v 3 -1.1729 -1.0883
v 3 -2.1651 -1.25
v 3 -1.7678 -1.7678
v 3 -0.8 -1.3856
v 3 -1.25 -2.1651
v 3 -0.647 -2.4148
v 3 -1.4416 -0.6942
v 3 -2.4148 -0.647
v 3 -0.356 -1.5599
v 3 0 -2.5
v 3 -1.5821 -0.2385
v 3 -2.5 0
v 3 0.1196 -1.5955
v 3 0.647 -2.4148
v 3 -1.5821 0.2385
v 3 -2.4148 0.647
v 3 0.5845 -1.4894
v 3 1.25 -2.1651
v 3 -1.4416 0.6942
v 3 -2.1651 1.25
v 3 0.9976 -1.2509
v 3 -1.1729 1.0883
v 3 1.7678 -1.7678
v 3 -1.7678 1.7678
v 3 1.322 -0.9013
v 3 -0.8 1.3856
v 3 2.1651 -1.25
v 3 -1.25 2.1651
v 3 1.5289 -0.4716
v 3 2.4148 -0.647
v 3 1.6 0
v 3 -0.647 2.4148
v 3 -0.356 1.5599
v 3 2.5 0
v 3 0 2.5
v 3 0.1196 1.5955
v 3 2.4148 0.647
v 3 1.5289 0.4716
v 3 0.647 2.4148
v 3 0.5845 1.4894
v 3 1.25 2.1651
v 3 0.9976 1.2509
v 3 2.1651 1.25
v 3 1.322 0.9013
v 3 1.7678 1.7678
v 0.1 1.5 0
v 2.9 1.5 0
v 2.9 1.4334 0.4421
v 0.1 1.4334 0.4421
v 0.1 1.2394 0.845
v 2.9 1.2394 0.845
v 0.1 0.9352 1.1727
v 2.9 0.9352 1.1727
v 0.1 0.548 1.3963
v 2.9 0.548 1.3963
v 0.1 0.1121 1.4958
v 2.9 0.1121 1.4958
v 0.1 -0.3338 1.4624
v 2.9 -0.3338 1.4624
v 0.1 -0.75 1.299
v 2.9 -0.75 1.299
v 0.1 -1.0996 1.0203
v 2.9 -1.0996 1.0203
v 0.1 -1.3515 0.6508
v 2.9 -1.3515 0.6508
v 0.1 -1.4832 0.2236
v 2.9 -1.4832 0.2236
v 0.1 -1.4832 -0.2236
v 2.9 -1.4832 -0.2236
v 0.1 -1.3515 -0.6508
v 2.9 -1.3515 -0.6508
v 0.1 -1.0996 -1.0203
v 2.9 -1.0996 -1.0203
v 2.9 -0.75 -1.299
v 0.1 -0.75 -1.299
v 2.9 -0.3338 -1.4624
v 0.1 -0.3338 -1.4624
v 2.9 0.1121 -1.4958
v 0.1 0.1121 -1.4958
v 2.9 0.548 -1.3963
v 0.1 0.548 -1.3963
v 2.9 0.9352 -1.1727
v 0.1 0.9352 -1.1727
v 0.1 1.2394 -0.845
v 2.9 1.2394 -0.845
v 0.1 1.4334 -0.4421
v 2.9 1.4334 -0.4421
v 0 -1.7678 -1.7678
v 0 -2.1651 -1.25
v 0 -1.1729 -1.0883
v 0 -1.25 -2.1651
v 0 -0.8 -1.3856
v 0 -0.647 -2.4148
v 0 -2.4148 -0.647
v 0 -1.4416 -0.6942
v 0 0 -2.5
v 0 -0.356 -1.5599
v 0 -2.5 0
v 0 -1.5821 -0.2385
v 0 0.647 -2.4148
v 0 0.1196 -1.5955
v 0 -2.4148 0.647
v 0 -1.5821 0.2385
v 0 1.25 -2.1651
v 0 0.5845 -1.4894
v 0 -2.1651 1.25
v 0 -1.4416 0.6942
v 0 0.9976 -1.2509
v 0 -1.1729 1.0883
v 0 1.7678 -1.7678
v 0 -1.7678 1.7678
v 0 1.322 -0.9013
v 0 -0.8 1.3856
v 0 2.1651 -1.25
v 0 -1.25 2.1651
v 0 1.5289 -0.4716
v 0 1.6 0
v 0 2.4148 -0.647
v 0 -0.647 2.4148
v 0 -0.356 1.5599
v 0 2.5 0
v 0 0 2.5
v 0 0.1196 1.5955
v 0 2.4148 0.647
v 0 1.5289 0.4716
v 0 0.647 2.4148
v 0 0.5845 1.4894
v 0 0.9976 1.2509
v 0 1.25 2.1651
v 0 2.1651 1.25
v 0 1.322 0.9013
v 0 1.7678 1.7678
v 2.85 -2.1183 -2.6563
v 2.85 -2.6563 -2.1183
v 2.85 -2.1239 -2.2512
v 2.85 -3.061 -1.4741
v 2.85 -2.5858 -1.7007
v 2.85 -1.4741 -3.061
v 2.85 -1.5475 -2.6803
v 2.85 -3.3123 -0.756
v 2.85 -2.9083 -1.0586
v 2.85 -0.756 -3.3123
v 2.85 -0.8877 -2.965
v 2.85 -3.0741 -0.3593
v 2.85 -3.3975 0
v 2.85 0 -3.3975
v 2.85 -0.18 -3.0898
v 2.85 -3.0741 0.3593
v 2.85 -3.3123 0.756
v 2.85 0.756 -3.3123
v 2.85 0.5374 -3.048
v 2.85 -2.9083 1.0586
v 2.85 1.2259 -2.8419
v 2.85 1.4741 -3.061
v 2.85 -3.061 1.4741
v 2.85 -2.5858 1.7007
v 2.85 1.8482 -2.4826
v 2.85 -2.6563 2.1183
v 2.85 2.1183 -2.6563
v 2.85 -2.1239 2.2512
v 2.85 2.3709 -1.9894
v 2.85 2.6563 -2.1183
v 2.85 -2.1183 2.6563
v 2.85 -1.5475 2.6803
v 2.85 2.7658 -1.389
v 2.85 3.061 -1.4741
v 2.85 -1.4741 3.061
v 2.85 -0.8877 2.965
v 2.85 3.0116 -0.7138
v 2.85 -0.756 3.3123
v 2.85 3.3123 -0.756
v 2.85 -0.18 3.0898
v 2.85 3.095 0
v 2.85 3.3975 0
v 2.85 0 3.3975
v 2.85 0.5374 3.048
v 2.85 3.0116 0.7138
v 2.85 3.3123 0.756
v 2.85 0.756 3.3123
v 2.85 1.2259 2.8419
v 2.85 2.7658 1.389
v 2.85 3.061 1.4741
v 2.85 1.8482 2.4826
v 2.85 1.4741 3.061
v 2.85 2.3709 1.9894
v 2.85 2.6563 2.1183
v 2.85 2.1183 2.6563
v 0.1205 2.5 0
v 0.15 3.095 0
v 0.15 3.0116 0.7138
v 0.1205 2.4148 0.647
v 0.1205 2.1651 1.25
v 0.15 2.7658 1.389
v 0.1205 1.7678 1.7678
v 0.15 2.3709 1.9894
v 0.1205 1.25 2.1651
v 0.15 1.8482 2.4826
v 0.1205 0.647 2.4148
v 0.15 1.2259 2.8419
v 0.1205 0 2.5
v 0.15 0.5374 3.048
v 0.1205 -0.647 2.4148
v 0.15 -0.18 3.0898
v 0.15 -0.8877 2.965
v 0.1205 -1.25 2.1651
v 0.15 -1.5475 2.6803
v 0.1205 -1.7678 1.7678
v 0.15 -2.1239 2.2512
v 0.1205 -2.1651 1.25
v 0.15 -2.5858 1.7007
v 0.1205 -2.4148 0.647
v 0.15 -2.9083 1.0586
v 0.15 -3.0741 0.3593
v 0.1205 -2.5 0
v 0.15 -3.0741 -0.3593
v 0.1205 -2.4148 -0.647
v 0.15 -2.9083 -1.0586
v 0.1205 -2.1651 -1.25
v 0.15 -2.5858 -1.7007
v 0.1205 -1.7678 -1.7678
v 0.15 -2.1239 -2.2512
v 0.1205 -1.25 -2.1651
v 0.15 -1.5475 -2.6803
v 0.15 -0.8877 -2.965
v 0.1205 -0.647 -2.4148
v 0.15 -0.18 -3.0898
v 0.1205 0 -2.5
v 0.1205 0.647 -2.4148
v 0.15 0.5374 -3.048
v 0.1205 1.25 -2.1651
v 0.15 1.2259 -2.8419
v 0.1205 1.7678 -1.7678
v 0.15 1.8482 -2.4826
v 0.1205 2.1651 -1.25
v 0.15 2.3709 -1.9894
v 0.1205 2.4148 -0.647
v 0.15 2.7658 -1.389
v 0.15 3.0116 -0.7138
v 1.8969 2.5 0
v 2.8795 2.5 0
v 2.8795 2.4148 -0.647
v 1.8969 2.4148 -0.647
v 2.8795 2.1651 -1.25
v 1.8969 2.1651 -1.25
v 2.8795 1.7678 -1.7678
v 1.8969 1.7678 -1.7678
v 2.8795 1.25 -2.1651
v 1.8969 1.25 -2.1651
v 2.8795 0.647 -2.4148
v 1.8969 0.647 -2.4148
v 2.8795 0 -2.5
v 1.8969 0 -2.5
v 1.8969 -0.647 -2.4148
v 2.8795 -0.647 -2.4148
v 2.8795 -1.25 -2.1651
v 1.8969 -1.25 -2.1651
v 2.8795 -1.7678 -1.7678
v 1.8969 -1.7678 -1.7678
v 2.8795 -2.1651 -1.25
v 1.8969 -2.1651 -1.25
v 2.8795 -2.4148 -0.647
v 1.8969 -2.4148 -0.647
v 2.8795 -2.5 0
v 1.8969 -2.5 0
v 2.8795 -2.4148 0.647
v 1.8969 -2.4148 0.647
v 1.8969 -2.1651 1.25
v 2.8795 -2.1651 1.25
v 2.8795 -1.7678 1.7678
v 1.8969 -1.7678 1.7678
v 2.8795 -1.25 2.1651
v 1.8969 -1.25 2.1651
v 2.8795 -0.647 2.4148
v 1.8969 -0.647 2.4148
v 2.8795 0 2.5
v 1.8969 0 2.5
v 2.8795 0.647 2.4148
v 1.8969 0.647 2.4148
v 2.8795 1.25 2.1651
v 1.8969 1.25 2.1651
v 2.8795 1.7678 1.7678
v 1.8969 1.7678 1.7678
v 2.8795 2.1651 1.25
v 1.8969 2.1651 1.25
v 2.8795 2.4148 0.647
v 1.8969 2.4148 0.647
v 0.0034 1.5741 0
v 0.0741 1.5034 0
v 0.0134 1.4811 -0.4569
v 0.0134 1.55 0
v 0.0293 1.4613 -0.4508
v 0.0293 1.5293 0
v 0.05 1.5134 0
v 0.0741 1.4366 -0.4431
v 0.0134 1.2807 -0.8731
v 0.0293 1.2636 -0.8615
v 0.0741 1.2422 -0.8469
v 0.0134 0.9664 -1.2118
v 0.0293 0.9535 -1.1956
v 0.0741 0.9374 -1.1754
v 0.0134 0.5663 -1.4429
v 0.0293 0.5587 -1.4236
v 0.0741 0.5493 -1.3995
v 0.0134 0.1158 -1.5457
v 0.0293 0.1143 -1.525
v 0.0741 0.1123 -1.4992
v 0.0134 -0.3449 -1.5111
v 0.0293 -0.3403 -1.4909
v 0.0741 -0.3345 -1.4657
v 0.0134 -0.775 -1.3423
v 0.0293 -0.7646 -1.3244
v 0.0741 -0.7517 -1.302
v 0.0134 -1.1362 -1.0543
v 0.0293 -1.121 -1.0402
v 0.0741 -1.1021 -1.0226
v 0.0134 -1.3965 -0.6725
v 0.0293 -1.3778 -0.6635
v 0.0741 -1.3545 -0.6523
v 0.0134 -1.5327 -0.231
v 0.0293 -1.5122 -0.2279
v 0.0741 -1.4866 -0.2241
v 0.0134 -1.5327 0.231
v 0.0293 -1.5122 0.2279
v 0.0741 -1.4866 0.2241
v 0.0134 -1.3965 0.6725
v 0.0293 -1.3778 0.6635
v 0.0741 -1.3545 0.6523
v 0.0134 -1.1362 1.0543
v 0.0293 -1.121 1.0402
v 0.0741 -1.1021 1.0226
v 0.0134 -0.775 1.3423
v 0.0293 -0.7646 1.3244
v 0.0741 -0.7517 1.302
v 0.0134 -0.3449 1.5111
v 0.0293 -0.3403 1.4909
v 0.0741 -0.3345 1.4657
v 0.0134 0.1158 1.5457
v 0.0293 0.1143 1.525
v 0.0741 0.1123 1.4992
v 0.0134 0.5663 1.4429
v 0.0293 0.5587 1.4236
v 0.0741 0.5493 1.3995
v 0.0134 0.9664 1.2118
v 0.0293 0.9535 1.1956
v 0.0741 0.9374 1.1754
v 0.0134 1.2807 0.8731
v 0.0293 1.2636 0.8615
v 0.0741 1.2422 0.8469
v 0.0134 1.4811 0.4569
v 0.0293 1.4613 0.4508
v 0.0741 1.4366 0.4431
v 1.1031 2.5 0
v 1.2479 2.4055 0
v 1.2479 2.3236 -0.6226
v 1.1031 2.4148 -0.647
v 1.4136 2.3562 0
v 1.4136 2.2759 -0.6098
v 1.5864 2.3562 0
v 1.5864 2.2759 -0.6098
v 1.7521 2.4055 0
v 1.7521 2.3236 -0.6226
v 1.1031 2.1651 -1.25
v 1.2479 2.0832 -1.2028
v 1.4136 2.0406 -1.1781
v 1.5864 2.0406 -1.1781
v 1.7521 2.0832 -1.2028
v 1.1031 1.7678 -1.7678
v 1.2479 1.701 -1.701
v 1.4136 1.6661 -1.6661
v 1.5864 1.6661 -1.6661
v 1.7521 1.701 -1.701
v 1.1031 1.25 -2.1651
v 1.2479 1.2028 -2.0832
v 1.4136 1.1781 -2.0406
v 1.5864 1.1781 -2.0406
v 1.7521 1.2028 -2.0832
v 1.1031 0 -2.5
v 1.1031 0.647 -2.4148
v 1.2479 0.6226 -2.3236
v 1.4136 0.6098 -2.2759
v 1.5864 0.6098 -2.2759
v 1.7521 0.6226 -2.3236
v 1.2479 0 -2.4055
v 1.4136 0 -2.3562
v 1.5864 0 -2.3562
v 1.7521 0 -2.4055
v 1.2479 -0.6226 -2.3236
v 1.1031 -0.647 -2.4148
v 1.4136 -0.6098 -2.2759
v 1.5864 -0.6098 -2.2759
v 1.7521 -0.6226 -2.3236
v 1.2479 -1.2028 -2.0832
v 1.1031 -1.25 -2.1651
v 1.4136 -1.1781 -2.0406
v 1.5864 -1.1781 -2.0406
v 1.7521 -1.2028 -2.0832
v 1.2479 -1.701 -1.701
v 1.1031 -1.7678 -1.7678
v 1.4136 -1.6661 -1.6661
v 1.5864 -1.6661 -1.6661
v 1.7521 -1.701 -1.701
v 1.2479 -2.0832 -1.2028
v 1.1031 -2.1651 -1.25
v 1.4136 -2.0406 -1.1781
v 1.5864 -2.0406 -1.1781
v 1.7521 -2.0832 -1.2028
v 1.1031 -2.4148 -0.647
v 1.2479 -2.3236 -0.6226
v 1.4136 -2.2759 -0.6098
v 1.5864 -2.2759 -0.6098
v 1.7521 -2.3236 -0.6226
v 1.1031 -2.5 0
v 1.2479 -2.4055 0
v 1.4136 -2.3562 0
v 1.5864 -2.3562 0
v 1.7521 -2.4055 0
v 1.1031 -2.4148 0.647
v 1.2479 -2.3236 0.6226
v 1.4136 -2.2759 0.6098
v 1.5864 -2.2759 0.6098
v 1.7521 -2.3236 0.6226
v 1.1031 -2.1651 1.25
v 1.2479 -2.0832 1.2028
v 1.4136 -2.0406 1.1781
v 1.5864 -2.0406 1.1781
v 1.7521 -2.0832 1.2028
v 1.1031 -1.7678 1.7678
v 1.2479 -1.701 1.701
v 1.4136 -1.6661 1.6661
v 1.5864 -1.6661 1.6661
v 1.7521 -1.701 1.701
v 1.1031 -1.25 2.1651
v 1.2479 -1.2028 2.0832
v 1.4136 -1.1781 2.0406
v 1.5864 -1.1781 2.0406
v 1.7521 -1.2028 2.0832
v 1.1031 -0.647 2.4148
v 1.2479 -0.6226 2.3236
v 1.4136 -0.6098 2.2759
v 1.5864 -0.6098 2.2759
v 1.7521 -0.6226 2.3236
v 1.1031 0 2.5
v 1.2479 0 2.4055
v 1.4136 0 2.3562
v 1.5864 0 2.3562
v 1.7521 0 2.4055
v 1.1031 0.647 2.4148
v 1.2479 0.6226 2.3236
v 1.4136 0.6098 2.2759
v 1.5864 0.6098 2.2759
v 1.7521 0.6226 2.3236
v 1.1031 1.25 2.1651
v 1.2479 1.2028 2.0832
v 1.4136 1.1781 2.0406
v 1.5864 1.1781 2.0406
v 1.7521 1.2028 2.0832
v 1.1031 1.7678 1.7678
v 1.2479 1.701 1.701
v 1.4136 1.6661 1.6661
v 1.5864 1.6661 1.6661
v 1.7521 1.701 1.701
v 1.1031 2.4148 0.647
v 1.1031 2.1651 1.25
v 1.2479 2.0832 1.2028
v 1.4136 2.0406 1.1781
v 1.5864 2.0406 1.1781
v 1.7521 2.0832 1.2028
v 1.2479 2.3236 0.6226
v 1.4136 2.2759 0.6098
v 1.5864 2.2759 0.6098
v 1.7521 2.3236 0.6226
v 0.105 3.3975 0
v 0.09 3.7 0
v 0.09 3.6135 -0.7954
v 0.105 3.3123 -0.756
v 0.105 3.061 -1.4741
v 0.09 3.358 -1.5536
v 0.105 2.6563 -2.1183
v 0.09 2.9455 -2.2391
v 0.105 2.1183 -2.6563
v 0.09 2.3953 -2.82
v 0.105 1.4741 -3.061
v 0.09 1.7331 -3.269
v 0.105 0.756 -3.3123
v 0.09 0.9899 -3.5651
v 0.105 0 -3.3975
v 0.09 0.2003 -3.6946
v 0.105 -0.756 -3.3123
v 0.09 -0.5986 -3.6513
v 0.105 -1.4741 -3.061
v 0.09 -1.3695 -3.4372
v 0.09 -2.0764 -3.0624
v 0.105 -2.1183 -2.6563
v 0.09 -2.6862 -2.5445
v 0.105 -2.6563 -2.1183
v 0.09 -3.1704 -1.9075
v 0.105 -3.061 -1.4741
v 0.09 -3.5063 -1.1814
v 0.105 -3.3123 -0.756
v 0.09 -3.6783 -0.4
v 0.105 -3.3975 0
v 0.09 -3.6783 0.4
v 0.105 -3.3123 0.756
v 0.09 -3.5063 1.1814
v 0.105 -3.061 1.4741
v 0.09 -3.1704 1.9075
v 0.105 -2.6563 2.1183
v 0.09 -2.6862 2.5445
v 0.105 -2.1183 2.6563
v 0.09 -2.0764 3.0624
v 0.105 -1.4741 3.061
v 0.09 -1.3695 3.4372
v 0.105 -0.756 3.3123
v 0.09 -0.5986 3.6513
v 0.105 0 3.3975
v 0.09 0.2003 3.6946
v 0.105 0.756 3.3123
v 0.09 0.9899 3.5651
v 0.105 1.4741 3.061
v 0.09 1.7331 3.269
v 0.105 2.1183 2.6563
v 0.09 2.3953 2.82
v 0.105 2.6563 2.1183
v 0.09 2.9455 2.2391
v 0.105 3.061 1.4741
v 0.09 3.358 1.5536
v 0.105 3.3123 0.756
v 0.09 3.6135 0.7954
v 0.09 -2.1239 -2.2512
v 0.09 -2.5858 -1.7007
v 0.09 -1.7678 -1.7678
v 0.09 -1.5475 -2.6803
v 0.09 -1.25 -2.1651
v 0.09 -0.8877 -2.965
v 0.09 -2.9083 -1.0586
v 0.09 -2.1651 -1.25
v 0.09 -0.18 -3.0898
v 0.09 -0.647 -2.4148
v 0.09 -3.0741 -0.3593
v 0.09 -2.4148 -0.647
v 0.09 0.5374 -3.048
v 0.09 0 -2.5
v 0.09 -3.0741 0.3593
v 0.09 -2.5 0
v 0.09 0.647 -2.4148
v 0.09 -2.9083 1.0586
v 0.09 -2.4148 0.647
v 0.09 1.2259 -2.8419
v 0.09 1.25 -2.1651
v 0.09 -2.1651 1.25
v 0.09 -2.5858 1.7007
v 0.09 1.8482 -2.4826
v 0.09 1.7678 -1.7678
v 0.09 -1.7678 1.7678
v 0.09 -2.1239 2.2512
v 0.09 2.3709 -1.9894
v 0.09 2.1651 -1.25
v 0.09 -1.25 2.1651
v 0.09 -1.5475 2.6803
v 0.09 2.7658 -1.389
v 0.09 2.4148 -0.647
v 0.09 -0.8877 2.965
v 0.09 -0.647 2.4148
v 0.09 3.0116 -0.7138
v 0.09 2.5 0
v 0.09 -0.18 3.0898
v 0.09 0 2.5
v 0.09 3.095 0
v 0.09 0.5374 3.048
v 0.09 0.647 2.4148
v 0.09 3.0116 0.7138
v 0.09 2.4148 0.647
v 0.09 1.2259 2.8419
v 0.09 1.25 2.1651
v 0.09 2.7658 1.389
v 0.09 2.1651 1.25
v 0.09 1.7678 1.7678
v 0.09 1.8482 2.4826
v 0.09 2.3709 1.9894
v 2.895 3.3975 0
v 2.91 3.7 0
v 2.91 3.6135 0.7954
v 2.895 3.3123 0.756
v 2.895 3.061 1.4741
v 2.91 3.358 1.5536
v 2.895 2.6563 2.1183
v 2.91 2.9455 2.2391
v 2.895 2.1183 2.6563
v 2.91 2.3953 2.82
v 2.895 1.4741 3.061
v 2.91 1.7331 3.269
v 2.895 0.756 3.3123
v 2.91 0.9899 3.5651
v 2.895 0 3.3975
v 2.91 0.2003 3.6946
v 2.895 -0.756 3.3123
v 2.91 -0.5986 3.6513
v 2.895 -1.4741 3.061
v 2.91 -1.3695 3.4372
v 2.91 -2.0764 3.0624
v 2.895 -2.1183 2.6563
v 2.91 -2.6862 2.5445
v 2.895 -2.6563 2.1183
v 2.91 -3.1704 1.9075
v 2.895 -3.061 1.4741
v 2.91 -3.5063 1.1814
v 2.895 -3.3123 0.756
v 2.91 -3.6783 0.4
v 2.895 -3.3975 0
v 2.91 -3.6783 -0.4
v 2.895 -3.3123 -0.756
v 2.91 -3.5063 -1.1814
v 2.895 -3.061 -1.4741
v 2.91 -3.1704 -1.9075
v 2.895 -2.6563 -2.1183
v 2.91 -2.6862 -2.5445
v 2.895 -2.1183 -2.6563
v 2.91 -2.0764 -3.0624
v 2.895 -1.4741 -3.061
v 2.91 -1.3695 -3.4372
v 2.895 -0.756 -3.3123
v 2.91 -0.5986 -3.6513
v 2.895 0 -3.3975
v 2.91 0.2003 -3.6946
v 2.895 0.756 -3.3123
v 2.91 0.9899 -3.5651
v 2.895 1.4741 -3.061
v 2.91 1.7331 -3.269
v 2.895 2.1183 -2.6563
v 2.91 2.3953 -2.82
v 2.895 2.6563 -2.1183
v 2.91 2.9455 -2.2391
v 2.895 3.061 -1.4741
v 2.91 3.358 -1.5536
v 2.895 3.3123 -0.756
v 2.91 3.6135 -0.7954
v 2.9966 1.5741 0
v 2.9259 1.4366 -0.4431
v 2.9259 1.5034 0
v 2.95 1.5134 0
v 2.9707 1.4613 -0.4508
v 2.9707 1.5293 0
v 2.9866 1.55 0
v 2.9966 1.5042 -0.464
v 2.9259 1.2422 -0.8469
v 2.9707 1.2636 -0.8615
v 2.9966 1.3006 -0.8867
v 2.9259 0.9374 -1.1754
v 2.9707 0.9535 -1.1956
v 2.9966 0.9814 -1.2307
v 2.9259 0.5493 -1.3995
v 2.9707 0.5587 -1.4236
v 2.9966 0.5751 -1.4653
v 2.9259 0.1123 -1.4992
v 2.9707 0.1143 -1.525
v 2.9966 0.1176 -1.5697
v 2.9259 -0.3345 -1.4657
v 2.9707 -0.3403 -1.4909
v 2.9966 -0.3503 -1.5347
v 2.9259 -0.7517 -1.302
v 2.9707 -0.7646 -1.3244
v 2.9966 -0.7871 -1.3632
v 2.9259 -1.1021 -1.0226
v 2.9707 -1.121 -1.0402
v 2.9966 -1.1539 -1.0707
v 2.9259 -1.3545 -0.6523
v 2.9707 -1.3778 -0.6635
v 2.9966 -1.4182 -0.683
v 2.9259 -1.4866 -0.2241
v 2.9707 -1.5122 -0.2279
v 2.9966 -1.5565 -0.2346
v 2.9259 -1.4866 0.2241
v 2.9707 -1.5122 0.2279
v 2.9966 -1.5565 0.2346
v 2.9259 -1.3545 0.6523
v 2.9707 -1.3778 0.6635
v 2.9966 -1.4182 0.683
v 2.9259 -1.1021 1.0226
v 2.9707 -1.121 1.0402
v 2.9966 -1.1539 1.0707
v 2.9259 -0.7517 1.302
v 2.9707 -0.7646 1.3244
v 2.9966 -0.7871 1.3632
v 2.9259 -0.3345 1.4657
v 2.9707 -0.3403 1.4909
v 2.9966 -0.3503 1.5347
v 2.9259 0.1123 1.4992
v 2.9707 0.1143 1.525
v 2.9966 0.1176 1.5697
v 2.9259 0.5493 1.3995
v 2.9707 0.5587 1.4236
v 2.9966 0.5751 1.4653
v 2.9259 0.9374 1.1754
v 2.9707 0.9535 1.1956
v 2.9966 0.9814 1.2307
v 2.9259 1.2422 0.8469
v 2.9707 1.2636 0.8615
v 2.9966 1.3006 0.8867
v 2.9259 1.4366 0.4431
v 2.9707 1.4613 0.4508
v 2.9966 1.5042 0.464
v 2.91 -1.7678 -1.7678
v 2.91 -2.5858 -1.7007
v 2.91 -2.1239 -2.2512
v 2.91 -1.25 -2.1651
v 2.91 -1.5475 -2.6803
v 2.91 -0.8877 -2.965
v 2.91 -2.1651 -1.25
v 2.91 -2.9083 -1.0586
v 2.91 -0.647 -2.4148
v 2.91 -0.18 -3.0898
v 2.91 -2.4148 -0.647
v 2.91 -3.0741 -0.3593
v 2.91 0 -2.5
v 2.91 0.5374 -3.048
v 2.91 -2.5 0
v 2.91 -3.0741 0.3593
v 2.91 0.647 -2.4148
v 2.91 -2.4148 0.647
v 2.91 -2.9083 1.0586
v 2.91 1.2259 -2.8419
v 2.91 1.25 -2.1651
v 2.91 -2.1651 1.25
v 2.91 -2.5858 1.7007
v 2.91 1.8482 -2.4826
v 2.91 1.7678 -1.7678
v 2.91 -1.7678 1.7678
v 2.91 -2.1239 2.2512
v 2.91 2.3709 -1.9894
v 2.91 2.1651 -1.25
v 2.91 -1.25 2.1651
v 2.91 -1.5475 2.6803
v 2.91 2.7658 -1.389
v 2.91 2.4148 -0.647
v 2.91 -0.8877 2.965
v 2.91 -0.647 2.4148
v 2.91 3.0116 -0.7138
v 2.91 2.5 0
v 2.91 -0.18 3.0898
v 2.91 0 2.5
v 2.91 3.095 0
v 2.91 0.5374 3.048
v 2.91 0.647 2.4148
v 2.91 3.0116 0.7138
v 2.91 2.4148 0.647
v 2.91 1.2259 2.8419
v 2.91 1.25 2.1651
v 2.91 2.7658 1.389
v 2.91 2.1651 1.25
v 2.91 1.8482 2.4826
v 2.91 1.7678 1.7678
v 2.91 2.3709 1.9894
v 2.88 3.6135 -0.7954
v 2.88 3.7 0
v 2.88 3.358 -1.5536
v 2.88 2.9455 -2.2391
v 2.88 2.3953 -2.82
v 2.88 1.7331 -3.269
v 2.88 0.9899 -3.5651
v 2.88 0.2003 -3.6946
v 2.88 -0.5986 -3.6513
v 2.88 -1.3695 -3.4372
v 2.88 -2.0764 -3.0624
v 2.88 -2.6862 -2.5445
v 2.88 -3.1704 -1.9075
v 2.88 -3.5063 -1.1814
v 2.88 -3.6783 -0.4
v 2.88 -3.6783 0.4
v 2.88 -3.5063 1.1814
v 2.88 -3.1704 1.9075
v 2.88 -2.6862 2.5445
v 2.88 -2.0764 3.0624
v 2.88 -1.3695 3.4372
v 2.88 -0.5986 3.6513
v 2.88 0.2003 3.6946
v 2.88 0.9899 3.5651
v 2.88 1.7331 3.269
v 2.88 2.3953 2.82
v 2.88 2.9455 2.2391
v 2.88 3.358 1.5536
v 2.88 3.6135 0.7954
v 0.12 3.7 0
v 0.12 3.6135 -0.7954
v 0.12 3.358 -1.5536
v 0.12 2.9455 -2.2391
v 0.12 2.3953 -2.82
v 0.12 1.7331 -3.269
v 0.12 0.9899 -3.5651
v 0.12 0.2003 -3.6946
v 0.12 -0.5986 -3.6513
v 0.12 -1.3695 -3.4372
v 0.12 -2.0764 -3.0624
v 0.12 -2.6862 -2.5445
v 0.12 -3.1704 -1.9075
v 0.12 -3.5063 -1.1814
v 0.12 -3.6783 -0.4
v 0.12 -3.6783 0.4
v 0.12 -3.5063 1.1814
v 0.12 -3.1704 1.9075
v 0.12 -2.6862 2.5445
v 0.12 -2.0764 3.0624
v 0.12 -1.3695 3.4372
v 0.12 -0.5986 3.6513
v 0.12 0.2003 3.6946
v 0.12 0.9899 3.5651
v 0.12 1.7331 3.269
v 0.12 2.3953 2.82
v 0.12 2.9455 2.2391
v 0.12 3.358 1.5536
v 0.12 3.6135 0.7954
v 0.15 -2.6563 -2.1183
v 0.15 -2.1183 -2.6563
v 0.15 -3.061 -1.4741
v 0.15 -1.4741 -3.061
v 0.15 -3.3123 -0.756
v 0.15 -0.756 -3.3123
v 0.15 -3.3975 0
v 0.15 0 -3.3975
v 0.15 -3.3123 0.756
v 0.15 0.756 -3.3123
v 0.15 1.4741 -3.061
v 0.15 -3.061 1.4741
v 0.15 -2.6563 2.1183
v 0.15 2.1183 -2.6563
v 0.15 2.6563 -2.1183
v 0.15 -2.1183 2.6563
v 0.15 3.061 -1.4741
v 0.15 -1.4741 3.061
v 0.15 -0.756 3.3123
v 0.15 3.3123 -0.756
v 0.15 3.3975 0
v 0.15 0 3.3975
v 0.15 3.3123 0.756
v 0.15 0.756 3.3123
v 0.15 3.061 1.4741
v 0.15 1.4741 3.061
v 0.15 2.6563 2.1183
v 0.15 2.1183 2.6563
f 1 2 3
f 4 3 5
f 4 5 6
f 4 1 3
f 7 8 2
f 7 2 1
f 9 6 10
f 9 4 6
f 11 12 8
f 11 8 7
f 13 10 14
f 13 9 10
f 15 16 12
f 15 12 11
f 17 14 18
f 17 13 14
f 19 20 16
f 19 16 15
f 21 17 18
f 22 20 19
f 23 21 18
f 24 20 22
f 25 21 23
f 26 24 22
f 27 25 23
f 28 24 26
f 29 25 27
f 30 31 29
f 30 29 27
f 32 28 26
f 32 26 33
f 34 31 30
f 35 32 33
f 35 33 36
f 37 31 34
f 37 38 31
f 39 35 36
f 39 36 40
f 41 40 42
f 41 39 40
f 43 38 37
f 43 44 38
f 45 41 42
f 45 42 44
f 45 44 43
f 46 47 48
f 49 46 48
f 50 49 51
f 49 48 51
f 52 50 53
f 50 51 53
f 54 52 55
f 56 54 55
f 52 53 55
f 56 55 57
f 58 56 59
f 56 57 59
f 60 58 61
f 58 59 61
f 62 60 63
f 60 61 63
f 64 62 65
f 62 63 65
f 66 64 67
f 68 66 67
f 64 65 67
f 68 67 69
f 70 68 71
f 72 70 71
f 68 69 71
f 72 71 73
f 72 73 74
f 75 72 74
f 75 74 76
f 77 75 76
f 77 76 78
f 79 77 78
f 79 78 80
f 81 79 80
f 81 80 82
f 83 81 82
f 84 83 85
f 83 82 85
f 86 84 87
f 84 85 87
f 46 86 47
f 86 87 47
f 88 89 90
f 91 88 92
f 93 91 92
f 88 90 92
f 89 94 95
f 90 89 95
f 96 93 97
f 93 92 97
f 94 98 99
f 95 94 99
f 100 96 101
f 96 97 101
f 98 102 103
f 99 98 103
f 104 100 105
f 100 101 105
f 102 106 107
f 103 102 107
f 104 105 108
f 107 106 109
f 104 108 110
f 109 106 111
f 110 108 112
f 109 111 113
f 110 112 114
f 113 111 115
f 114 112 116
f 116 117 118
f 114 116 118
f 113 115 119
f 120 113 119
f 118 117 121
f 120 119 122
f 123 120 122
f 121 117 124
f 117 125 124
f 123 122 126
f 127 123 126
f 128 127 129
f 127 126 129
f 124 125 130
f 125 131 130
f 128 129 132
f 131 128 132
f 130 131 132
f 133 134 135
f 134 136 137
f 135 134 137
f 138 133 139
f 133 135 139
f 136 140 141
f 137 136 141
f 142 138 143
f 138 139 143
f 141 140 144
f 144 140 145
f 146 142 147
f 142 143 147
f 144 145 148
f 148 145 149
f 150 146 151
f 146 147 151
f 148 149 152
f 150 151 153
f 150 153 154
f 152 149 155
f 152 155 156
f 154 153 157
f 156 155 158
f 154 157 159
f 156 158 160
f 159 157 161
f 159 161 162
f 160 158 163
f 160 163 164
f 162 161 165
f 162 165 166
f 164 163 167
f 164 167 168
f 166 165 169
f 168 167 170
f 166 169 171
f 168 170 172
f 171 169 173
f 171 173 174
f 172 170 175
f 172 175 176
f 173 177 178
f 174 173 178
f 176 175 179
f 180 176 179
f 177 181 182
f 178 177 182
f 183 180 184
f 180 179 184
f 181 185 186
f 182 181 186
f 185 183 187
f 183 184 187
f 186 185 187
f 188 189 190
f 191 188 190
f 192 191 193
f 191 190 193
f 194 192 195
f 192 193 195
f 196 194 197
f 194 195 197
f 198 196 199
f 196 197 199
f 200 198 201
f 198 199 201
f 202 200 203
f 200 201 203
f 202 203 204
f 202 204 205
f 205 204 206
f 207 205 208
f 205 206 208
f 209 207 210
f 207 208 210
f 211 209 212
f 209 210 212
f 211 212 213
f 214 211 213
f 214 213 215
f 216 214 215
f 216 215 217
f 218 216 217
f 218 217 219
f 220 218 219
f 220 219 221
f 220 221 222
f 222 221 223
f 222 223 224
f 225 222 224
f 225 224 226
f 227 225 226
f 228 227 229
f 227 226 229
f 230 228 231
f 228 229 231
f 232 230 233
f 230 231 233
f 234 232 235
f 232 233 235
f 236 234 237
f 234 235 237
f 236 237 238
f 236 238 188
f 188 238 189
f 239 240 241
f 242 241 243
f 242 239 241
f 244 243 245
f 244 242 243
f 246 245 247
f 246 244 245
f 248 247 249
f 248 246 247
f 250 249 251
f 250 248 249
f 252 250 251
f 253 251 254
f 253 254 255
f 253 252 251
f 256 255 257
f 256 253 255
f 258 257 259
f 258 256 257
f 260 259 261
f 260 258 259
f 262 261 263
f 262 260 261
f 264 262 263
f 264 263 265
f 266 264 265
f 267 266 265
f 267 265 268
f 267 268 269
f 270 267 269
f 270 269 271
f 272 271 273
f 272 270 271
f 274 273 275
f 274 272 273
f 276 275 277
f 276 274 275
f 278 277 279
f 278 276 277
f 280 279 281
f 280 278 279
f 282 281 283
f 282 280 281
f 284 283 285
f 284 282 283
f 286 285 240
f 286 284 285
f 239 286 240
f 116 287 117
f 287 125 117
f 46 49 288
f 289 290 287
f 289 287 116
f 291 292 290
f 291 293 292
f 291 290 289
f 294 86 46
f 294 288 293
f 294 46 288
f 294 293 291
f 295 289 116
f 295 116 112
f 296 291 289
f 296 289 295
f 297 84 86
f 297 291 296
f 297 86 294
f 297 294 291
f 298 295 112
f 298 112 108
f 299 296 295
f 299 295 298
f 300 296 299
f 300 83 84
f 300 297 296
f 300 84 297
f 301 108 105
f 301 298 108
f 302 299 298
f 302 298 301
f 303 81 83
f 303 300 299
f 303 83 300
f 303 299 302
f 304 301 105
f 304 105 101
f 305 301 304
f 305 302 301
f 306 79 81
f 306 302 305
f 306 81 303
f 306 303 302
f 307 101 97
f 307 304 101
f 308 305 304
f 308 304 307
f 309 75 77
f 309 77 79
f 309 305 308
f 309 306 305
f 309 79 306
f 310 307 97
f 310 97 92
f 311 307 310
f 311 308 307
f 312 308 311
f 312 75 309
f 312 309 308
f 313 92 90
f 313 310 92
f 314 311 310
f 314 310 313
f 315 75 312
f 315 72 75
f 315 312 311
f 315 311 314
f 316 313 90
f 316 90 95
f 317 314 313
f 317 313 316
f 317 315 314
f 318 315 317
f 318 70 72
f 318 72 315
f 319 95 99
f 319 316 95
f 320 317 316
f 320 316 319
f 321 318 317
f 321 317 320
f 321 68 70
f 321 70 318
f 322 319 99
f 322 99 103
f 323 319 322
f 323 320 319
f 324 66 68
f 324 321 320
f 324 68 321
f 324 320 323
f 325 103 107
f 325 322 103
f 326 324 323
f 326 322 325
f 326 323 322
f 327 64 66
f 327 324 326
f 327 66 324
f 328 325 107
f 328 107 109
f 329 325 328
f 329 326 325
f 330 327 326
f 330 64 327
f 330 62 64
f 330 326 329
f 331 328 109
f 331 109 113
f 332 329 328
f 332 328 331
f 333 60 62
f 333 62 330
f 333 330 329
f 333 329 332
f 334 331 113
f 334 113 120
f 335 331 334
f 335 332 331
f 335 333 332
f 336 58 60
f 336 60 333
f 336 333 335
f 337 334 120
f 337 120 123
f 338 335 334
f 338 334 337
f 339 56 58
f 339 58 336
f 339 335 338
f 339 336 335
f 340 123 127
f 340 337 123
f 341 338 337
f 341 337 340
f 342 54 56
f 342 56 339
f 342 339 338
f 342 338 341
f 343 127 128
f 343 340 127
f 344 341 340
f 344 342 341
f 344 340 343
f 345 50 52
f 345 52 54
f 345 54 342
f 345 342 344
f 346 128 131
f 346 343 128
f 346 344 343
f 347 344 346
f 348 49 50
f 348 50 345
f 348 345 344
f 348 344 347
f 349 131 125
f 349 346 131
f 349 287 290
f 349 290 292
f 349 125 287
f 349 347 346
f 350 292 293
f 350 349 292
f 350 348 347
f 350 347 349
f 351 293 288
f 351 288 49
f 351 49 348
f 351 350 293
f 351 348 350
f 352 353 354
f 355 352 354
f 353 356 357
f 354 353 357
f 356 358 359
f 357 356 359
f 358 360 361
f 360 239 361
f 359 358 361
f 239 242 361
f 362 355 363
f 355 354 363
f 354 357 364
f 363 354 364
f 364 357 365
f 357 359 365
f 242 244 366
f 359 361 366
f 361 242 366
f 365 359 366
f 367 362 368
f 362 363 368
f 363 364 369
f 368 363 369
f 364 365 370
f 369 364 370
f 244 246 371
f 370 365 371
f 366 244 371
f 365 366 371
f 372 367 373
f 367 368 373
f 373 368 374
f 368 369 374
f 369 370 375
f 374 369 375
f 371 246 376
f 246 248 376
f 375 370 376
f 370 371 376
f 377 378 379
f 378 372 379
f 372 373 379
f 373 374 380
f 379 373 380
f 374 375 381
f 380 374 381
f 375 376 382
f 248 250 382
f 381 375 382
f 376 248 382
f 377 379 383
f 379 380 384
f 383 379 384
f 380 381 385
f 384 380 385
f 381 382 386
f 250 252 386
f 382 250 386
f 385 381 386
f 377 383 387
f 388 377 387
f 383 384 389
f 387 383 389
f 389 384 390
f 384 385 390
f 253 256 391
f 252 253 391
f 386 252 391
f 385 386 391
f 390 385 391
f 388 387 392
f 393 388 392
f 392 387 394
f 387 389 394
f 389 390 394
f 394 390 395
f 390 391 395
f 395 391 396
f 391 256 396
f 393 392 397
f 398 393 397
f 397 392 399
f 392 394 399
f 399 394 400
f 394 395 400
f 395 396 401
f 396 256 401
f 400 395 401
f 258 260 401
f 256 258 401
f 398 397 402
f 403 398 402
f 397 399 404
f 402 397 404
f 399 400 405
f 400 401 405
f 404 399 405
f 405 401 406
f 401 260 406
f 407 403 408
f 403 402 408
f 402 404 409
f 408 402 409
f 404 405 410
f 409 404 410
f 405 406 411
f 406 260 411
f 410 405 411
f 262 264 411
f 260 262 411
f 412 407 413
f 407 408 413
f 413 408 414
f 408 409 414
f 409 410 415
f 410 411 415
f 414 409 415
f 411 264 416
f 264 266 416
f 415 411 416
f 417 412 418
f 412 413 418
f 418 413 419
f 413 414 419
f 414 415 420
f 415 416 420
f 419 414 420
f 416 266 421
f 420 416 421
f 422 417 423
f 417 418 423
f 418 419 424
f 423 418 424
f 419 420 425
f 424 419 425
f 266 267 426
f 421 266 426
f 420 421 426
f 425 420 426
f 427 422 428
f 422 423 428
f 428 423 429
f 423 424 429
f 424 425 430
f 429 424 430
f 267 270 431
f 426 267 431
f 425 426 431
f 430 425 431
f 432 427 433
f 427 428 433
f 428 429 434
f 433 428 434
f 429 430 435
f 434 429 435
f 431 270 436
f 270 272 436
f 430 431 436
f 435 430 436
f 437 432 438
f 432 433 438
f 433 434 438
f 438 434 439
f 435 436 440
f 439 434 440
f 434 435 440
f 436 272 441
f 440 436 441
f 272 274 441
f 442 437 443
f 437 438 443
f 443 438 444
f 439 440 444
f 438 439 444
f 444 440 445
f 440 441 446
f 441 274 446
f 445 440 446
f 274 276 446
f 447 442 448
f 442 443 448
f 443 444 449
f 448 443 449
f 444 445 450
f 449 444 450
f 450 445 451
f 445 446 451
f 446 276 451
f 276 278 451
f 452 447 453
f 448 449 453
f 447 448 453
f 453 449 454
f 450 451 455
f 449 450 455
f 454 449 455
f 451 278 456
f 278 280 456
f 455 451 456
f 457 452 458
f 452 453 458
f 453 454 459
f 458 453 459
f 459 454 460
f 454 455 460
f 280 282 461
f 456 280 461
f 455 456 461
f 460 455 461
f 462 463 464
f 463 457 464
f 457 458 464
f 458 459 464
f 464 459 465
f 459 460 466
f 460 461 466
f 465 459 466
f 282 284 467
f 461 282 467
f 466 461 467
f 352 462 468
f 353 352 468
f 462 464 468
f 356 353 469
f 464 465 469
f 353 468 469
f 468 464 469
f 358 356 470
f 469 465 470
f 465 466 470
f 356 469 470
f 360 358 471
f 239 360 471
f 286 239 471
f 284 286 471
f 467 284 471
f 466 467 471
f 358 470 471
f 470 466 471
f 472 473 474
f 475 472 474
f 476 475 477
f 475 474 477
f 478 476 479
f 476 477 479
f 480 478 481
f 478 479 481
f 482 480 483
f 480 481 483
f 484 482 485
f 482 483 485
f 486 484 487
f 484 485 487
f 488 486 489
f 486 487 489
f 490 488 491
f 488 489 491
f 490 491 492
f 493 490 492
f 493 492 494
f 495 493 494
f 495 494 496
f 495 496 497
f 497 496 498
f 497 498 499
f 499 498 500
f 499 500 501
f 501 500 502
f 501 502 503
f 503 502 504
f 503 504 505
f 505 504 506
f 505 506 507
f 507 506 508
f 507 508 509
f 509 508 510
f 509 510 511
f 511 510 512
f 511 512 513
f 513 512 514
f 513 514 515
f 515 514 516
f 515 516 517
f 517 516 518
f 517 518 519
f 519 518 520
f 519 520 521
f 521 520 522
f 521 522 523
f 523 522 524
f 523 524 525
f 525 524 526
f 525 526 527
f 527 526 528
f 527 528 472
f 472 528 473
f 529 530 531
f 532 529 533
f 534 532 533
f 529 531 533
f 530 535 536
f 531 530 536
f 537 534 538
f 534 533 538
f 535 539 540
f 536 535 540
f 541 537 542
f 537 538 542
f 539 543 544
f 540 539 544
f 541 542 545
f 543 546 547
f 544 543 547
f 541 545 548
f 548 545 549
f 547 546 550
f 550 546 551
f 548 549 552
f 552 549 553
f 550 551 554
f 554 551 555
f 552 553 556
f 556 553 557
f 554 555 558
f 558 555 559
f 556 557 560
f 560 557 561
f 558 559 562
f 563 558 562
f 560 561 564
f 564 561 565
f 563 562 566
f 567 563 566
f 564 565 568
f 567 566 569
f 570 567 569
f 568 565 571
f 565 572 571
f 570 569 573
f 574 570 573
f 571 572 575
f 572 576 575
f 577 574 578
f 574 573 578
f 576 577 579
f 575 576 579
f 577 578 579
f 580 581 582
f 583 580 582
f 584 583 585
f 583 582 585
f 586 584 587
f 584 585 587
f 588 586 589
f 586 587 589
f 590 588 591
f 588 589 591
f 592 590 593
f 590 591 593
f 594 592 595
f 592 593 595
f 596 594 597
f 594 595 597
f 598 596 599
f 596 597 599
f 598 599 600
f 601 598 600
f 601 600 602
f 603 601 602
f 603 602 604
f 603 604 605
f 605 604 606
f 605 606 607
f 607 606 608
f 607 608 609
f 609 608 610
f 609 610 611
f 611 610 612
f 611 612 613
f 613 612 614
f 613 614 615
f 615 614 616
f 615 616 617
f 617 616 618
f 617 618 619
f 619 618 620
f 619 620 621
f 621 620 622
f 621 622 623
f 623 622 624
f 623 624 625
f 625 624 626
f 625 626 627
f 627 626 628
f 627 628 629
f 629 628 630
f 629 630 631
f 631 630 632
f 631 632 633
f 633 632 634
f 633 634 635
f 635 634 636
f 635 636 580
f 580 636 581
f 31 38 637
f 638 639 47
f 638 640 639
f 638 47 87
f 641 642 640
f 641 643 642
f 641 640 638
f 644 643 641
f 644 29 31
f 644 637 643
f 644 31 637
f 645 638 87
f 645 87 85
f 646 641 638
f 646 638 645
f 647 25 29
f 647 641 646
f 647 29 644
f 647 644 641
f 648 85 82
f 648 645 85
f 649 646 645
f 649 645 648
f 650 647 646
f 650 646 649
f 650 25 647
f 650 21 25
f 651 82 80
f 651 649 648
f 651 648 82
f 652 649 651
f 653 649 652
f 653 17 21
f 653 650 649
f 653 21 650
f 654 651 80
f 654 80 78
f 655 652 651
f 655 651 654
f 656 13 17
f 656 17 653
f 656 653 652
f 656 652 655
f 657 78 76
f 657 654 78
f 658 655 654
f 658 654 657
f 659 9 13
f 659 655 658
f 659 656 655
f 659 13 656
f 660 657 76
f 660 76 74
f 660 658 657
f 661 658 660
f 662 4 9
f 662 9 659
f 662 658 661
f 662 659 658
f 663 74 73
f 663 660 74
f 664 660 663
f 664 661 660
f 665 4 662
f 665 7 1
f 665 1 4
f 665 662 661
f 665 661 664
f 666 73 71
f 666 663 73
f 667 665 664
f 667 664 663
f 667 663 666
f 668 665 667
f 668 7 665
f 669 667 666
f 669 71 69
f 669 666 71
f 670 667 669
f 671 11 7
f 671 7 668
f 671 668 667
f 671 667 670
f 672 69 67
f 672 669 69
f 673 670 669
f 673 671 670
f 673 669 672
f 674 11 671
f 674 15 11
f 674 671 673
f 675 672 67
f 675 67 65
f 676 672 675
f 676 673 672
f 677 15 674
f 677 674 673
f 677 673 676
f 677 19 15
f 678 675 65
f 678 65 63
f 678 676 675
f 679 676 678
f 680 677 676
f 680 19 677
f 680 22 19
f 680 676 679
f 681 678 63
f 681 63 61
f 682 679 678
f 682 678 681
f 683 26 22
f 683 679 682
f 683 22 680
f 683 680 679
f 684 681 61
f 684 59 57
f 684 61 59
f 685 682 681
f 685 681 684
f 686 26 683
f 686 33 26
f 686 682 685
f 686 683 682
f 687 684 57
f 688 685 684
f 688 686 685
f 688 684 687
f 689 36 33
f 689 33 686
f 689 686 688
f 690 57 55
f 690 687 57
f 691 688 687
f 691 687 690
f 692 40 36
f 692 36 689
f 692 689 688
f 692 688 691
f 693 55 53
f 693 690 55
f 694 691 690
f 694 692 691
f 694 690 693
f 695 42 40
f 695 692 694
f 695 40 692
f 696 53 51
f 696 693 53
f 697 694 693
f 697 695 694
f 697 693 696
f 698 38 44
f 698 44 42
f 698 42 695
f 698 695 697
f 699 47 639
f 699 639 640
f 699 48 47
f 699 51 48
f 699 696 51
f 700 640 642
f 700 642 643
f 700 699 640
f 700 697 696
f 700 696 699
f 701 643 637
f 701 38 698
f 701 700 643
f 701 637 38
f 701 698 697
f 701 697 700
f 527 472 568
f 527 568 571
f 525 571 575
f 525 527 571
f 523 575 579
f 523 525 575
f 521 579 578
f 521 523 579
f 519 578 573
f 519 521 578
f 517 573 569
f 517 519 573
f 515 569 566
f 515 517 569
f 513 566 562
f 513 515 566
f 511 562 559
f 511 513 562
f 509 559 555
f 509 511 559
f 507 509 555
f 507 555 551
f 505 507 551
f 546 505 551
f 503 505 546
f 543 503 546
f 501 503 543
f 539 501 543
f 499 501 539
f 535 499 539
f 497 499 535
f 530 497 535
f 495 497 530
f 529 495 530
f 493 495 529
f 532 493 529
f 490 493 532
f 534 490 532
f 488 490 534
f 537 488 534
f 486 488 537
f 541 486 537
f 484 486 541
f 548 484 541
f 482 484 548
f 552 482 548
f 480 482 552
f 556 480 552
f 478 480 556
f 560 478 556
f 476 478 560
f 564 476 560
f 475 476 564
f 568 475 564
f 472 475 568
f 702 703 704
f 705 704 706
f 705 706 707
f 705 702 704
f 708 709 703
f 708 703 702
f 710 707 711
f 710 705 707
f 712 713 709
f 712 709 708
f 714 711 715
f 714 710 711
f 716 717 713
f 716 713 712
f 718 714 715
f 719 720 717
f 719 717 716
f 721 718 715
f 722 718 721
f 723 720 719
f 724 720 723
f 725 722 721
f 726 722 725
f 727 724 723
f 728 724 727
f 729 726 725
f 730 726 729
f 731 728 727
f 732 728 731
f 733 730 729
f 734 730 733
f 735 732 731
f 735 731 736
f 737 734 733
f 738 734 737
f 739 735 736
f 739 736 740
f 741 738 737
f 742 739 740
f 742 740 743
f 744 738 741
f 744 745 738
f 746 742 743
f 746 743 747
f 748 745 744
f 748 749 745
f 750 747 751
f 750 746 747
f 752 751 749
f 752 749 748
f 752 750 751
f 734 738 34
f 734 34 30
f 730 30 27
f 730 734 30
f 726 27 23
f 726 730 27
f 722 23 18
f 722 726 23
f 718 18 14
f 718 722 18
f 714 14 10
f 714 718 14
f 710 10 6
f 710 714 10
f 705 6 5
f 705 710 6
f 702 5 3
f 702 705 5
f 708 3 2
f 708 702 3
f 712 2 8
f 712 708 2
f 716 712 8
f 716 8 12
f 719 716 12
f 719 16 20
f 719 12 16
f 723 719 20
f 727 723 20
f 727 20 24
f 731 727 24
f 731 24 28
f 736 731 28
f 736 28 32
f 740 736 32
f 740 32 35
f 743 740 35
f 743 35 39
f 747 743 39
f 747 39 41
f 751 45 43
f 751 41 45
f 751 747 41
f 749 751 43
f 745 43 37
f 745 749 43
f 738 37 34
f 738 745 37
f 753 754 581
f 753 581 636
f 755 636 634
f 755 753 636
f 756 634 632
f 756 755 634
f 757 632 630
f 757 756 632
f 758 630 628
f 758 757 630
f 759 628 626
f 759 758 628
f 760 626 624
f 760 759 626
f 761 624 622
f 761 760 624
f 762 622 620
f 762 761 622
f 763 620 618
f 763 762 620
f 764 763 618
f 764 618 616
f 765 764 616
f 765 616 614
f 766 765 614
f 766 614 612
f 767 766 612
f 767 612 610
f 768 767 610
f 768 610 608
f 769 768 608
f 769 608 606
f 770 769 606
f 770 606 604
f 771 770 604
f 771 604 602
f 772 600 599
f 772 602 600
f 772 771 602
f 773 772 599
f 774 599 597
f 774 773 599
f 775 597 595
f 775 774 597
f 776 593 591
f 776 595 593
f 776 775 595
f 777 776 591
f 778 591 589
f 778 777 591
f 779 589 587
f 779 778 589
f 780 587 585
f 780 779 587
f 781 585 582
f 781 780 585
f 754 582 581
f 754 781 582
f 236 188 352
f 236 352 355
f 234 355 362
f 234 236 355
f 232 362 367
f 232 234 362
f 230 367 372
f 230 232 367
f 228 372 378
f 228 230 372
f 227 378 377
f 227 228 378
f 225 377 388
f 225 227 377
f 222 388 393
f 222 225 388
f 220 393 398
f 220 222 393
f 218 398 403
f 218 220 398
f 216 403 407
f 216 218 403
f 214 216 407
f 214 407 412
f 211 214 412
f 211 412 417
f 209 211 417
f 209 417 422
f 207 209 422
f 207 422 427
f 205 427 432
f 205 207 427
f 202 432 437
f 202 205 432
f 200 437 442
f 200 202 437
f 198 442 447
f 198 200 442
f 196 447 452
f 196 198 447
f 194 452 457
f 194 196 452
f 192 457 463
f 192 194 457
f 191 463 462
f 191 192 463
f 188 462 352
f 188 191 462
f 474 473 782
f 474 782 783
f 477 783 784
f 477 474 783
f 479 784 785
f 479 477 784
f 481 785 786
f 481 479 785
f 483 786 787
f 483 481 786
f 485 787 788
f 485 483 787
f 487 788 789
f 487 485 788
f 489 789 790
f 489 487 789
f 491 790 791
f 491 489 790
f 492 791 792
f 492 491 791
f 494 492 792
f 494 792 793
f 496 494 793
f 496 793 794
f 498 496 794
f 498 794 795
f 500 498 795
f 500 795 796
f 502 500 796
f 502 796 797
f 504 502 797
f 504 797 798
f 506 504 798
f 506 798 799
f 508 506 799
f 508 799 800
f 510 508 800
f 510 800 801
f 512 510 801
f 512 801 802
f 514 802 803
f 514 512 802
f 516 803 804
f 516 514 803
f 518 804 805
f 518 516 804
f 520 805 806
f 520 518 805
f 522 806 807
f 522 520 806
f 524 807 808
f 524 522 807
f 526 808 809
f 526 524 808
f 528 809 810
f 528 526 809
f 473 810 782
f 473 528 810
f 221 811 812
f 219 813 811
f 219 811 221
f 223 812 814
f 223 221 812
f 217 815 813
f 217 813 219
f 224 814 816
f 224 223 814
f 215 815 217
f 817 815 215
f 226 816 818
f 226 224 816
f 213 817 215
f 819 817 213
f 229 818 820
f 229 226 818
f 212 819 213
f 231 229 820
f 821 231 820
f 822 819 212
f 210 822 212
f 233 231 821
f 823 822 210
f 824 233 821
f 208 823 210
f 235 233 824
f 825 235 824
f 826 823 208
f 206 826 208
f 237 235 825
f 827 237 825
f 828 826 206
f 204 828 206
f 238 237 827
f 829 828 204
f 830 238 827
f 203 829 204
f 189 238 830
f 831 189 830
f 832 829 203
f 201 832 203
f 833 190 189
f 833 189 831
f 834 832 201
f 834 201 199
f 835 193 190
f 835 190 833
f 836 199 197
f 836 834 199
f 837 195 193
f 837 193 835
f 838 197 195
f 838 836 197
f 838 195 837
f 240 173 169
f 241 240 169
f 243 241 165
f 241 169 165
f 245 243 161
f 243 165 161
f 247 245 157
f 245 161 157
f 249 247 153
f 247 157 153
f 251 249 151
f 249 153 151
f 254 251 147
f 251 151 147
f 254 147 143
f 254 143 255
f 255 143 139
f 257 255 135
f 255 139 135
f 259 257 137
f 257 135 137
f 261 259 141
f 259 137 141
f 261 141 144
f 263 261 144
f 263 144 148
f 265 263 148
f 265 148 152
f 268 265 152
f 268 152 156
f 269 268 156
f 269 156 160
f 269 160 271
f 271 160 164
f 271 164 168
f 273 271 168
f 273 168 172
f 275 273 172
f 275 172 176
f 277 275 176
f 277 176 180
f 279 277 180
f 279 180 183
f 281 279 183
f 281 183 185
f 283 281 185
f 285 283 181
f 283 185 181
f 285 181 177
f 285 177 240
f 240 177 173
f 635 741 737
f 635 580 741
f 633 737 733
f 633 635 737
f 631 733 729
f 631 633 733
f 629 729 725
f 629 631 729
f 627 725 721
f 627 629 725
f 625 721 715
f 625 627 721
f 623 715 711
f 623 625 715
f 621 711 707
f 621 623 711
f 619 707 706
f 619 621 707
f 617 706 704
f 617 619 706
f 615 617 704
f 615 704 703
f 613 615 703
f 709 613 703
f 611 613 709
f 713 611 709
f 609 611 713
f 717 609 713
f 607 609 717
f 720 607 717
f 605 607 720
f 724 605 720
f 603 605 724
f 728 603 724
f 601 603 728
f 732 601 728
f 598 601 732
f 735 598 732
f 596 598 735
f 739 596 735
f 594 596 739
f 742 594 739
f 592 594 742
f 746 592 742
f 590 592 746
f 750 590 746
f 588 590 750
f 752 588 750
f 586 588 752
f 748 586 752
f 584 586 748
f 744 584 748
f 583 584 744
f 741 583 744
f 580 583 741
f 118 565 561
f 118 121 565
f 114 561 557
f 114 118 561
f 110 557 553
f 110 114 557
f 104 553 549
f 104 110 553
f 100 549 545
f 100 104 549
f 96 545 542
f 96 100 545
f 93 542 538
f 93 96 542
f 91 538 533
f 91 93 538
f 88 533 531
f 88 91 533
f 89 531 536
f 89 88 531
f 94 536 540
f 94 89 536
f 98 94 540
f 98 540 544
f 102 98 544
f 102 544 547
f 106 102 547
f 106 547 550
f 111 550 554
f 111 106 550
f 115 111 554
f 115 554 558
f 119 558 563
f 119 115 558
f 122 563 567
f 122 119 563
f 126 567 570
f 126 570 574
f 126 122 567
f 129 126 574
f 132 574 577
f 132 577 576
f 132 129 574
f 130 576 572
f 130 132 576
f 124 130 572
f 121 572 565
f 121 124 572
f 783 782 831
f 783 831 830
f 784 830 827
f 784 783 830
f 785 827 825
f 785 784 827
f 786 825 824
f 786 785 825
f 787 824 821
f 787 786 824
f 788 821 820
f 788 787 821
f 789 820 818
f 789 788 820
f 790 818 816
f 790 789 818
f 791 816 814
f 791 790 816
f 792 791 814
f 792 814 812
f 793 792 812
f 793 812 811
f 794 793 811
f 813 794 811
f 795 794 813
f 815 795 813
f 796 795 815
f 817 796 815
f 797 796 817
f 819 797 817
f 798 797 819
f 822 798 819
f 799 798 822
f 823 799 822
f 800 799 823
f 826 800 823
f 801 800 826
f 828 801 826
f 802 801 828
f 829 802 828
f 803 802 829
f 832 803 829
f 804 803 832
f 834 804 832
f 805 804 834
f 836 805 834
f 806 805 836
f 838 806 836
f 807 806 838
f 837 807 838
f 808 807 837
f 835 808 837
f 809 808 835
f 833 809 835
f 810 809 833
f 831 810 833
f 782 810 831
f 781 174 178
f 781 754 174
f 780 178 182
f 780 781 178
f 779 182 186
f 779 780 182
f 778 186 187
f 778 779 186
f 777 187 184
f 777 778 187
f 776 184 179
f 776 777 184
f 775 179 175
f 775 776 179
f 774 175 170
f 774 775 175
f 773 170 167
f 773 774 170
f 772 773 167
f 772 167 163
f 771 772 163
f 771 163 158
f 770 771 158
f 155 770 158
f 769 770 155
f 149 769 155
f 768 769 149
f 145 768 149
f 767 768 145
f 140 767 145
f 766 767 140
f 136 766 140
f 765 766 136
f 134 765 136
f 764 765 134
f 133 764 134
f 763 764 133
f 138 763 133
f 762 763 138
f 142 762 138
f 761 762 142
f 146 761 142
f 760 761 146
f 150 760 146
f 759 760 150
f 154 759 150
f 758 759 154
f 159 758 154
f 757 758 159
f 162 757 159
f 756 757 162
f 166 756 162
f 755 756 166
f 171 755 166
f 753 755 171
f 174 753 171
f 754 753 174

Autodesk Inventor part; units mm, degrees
ref_plane "YZ Plane" through (0, 0, 0) normal (1, 0, 0) x (0, 1, 0)
ref_plane "XZ Plane" through (0, 0, 0) normal (0, 1, 0) x (-1, 0, 0)
ref_plane "XY Plane" through (0, 0, 0) normal (0, 0, 1) x (1, 0, 0)
sketch "Sketch_18" plane through (0, 0, 0) normal (0, 0, 1) x (1, 0, 0)
  line L0 (50, 0) -> (-50, 0)
  arc A0 (0, 1.6) -> (0.1, 1.5) centre (0.1, 1.6) ccw
  line L1 (0.1, 1.5) -> (2.9, 1.5)
  arc A1 (2.9, 1.5) -> (3, 1.6) centre (2.9, 1.6) ccw
  line L2 (3, 1.6) -> (3, 2.5)
  line L3 (3, 2.5) -> (1.8969, 2.5)
  arc A2 (1.1031, 2.5) -> (1.8969, 2.5) centre (1.5, 2.95) ccw
  line L4 (1.1031, 2.5) -> (0, 2.5)
  line L5 (0, 2.5) -> (0, 1.6)
revolve "Revolution1" add sketch "Sketch_18" angle 360 about axis through (50, 0, 0) along (1, 0, 0)
sketch "Sketch_20" plane through (0, 0, 0) normal (0, 0, 1) x (1, 0, 0)
  line L0 (50, 0) -> (-50, 0)
  line L1 (0.09, 3.7) -> (0.105, 3.3975)
  line L2 (0.105, 3.3975) -> (0.09, 3.095)
  line L3 (0.09, 3.095) -> (0.09, 2.49)
  line L4 (0.09, 2.49) -> (0.12, 2.49)
  line L5 (0.12, 2.49) -> (0.15, 3.095)
  line L6 (0.15, 3.095) -> (0.15, 3.3975)
  line L7 (0.15, 3.3975) -> (0.12, 3.7)
  line L8 (0.12, 3.7) -> (0.09, 3.7)
revolve "Revolution2" add sketch "Sketch_20" angle 360 about axis through (50, 0, 0) along (1, 0, 0)
sketch "Sketch_21" plane through (0, 0, 0) normal (0, 0, 1) x (1, 0, 0)
  line L0 (50, 0) -> (-50, 0)
  line L1 (2.85, 3.3975) -> (2.85, 3.095)
  line L2 (2.85, 3.095) -> (2.88, 2.49)
  line L3 (2.88, 2.49) -> (2.91, 2.49)
  line L4 (2.91, 2.49) -> (2.91, 3.095)
  line L5 (2.91, 3.095) -> (2.895, 3.3975)
  line L6 (2.895, 3.3975) -> (2.91, 3.7)
  line L7 (2.91, 3.7) -> (2.88, 3.7)
  line L8 (2.88, 3.7) -> (2.85, 3.3975)
revolve "Revolution3" add sketch "Sketch_21" angle 360 about axis through (50, 0, 0) along (1, 0, 0)
properties part number "SKF_W 619/3-2Z_PART1"
